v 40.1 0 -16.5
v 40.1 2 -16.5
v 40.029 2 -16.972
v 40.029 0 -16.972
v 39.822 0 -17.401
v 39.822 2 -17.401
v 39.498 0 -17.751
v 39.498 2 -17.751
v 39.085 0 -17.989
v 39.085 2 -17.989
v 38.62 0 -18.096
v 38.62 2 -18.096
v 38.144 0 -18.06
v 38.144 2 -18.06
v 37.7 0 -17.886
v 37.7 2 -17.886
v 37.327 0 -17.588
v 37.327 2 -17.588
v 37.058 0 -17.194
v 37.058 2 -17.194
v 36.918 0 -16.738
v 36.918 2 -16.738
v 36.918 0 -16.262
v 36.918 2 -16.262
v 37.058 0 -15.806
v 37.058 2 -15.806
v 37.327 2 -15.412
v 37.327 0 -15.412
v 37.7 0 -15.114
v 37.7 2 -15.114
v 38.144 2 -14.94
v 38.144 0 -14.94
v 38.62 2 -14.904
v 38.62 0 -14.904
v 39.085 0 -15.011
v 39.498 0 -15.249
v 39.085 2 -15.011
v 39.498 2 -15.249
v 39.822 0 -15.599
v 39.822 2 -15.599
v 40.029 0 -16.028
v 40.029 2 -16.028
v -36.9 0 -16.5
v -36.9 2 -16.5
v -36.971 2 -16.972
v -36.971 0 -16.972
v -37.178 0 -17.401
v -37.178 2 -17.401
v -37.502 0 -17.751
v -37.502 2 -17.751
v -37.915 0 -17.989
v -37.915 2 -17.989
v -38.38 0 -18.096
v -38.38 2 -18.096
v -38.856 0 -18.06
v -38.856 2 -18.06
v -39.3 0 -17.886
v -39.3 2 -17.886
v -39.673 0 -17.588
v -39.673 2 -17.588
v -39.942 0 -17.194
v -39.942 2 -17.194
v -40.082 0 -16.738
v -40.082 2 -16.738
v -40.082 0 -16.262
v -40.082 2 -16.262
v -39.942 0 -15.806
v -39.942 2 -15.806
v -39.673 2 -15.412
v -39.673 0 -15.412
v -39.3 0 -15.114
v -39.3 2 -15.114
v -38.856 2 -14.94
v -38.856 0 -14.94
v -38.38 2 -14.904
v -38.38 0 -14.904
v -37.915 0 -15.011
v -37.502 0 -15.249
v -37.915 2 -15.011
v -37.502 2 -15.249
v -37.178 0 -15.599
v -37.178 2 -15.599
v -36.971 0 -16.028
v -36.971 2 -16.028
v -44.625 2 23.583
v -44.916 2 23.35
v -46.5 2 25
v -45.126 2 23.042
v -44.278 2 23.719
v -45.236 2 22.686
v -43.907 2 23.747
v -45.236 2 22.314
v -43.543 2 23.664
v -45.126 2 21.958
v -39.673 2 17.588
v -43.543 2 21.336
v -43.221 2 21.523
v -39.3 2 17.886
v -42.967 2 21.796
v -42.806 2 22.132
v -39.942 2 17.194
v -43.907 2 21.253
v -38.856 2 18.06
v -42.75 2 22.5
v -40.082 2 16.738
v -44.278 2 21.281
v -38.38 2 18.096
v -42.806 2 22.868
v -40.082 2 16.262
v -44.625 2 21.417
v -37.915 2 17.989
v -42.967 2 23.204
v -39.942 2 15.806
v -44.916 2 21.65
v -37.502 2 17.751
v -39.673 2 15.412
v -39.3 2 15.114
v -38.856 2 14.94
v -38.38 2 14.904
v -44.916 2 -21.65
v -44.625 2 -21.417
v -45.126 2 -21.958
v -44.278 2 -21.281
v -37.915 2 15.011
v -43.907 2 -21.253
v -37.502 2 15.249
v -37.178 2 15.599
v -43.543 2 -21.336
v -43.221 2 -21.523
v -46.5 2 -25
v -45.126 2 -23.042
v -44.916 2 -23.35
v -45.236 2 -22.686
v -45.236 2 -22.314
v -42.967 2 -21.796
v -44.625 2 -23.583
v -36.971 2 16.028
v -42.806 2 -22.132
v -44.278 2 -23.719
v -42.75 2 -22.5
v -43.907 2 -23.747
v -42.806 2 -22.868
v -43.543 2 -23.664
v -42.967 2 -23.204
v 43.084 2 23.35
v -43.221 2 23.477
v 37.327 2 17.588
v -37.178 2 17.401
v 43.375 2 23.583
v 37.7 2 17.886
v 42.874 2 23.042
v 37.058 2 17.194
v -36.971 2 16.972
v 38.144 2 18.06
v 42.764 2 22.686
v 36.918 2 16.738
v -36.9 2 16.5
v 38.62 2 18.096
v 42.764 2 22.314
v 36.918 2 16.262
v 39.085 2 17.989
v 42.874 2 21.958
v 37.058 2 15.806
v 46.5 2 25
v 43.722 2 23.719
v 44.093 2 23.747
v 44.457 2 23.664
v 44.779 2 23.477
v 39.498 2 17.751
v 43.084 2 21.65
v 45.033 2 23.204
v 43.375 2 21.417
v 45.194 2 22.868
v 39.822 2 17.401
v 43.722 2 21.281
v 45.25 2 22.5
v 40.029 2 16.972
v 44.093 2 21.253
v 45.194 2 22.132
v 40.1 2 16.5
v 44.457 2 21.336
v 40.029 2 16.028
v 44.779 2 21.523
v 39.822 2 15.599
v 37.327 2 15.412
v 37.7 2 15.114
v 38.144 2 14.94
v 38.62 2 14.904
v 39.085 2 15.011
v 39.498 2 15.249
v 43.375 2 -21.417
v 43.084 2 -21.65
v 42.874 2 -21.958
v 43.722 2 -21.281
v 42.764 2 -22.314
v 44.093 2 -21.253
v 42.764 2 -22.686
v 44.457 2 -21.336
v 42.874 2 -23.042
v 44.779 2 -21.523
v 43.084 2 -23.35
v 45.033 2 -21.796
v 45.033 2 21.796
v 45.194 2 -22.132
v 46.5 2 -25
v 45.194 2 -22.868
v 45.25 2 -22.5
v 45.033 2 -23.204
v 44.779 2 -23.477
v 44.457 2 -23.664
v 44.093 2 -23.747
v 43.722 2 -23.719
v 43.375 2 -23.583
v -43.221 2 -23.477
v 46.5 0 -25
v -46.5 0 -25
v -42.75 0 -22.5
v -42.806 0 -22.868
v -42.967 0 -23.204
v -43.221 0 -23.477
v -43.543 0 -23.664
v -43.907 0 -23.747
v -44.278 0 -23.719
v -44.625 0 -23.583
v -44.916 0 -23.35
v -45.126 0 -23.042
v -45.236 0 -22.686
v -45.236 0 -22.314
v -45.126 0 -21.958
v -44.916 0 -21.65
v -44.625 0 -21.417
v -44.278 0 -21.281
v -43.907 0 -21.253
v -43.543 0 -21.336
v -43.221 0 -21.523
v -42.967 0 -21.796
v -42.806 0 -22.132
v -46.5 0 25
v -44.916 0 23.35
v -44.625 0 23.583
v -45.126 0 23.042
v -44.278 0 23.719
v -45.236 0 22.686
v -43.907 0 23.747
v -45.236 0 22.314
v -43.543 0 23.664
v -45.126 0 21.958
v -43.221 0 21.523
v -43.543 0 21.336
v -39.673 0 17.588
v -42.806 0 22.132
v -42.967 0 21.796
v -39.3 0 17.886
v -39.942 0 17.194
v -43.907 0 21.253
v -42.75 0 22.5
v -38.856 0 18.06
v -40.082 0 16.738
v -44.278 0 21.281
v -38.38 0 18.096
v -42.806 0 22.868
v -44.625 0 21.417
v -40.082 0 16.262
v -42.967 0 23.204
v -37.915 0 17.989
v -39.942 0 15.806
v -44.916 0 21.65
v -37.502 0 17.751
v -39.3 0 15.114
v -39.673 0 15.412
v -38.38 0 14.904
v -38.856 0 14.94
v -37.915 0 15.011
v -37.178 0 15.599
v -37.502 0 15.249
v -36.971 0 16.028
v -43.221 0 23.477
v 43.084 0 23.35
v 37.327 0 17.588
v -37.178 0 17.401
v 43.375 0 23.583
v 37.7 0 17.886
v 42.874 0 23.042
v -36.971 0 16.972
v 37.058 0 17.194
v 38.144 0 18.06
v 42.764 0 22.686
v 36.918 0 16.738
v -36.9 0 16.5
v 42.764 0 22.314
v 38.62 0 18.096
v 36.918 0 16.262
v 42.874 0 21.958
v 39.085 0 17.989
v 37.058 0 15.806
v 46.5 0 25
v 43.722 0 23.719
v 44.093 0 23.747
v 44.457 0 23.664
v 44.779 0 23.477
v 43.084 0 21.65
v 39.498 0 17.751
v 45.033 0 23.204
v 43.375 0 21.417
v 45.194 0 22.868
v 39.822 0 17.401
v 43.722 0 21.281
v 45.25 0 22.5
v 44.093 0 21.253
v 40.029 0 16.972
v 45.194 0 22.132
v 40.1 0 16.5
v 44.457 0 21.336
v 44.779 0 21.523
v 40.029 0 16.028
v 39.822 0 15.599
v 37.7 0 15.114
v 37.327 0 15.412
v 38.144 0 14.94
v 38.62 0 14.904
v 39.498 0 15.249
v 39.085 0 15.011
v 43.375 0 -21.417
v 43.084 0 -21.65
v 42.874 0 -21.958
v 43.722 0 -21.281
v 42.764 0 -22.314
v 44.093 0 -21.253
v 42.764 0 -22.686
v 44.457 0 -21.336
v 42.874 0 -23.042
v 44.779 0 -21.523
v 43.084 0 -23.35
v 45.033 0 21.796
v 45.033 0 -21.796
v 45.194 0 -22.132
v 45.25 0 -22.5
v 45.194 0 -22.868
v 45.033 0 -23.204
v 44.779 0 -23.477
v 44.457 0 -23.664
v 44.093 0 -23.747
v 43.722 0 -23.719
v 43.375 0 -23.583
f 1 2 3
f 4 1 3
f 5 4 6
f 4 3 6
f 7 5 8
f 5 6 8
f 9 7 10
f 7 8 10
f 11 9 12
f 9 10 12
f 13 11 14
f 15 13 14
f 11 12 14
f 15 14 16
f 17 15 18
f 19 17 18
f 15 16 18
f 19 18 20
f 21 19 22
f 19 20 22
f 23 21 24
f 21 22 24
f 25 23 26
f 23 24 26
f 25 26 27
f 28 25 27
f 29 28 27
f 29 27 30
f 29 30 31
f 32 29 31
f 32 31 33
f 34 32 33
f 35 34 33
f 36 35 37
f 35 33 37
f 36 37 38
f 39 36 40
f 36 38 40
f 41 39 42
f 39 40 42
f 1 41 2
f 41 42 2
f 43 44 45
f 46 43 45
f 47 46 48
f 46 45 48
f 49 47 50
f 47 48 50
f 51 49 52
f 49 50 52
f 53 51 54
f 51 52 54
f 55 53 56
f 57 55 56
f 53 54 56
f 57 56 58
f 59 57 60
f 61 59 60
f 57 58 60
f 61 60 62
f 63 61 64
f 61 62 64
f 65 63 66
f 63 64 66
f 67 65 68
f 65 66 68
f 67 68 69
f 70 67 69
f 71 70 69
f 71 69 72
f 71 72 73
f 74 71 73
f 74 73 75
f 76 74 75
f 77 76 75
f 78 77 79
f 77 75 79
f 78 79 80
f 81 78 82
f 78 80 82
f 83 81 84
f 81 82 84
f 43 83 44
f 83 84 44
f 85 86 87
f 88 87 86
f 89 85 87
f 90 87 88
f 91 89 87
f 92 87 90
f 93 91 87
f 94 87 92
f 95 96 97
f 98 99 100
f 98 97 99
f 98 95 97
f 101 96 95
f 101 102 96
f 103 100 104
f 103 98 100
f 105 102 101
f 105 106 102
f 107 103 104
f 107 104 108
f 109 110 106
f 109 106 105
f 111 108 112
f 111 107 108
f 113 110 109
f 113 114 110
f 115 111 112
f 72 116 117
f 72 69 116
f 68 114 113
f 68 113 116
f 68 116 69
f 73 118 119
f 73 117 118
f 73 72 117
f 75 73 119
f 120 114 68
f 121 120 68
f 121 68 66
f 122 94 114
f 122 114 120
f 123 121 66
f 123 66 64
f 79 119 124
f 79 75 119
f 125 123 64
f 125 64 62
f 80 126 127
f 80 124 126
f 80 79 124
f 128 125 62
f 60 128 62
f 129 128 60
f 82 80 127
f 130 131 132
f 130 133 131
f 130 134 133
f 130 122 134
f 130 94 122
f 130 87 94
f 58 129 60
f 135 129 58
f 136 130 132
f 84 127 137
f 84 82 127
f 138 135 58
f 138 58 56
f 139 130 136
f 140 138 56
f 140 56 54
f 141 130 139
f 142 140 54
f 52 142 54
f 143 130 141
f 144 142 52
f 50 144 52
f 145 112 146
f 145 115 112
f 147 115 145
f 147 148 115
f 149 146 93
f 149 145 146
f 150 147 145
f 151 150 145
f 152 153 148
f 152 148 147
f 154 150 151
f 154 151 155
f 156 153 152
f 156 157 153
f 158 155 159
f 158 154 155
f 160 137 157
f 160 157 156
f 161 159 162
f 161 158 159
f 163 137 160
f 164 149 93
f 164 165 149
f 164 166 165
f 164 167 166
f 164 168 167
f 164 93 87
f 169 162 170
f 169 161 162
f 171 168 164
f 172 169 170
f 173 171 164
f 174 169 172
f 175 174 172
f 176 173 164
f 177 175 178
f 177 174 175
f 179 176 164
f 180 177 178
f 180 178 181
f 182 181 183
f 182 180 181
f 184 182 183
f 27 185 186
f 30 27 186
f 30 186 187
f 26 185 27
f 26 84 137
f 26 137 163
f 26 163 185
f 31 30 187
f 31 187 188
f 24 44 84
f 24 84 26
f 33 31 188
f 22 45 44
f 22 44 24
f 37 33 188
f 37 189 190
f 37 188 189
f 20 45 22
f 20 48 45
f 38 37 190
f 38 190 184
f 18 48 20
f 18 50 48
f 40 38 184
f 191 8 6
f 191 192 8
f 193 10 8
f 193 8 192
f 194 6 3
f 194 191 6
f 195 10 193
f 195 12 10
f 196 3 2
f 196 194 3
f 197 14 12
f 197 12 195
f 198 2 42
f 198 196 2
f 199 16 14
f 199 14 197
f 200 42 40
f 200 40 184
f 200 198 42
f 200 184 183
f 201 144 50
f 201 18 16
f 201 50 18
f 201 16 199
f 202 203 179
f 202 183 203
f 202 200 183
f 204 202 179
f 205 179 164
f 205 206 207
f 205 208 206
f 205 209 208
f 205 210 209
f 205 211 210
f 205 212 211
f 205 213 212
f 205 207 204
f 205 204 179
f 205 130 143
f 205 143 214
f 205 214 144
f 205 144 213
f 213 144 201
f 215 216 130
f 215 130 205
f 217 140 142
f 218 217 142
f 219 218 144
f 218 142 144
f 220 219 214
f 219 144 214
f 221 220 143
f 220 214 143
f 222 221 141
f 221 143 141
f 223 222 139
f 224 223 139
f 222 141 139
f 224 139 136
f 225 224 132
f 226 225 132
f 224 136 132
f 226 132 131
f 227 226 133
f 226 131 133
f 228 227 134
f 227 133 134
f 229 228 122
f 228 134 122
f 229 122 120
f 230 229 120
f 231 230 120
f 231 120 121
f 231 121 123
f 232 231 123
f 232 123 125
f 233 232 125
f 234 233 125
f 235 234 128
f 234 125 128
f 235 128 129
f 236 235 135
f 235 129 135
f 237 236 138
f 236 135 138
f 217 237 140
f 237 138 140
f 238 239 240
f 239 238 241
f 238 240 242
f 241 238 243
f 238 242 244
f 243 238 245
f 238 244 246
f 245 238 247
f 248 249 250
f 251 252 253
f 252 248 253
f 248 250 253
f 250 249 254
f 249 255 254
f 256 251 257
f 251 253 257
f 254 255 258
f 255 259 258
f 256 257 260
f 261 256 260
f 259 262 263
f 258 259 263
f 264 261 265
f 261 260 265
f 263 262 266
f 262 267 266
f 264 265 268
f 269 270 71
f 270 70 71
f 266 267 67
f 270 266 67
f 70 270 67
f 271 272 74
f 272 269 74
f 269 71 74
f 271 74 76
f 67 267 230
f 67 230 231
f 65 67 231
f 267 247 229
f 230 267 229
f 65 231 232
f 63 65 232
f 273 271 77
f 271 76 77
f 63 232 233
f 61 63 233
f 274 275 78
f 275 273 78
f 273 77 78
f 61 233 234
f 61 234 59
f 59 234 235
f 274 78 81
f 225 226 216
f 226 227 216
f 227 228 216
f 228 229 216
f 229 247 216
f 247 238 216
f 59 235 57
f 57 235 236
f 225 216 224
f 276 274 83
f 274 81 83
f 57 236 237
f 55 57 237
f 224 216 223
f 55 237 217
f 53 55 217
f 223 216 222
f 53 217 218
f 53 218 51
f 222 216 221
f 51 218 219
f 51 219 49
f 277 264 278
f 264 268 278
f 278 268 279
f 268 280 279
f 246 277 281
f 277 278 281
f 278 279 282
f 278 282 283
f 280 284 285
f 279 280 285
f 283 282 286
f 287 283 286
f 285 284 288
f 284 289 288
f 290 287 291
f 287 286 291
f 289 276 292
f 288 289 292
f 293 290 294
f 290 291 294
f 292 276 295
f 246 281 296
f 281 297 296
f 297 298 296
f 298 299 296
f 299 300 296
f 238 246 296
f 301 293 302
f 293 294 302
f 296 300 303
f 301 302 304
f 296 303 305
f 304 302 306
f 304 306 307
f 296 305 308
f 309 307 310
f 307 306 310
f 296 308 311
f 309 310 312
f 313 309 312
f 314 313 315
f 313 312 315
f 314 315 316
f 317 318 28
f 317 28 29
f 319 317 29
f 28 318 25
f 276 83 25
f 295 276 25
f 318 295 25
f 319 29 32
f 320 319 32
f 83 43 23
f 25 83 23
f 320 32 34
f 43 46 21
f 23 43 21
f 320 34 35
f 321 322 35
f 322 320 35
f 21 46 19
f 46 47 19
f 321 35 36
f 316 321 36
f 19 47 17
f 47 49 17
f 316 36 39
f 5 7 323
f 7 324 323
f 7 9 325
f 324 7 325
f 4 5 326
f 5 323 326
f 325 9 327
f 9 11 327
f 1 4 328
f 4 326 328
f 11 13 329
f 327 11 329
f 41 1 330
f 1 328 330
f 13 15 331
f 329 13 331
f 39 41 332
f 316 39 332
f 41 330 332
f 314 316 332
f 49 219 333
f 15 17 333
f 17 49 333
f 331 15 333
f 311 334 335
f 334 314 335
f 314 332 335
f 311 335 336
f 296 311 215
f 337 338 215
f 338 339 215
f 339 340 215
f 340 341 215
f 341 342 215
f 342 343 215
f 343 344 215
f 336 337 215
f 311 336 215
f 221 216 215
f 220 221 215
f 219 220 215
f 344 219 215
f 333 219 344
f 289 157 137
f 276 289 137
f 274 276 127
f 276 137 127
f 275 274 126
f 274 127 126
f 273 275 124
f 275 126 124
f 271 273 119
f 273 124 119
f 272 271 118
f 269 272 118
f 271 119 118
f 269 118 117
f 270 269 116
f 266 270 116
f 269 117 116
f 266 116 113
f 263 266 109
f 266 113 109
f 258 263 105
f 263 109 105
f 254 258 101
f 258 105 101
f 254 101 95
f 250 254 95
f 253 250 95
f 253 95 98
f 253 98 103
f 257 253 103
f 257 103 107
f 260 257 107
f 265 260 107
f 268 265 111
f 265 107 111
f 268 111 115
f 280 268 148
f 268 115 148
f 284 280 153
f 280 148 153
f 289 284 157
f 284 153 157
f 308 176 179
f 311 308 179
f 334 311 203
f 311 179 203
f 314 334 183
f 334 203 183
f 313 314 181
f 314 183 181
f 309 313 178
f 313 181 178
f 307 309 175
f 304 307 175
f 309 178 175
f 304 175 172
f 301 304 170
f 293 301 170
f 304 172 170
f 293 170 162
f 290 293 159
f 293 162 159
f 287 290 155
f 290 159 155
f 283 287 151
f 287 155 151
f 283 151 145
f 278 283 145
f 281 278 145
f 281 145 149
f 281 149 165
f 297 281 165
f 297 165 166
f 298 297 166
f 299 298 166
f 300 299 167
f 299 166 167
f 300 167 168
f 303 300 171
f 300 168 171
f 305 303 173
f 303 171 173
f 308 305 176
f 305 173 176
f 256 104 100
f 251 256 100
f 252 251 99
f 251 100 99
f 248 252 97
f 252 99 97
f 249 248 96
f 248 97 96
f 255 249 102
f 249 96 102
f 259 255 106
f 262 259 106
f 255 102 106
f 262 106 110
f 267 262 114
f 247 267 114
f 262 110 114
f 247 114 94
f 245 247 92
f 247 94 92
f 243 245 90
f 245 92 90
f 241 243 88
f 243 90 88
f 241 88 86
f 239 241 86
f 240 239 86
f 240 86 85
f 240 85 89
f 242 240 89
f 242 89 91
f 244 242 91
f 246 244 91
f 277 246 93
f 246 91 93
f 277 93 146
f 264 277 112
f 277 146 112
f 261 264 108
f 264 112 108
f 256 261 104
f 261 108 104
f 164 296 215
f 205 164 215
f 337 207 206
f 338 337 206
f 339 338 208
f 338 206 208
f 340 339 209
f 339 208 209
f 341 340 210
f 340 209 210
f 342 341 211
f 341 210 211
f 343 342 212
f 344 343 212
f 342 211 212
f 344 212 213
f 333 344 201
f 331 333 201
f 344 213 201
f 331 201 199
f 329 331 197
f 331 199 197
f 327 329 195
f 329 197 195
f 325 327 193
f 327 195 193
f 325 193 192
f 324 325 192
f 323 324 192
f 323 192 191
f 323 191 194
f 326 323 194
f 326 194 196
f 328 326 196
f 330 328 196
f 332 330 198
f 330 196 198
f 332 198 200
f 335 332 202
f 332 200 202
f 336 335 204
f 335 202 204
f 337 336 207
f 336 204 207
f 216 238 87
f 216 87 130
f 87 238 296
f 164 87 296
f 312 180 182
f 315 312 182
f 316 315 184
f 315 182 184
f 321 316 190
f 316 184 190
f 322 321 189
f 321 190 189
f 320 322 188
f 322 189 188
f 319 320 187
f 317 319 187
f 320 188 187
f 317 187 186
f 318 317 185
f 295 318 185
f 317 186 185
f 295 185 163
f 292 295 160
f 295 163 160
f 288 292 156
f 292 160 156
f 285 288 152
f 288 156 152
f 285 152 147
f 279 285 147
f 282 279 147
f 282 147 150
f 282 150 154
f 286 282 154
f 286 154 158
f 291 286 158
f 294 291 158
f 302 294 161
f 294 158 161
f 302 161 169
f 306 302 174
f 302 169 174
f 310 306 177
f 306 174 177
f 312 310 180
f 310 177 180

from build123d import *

# Parameters (mm, degrees)
SKETCH1_W           = 93
SKETCH1_H           = 50
BOSS_EXTRUDE1_DEPTH = 2
SKETCH2_R           = 1.25
CUT_EXTRUDE1_DEPTH  = 2
SKETCH3_R           = 1.6
CUT_EXTRUDE2_DEPTH  = 2


with BuildPart() as part:
    # Sketch1 → Boss-Extrude1 (new body)
    with BuildSketch(Plane(origin=(0, 0, 0), x_dir=(1, 0, 0), z_dir=(0, 1, 0))):
        Rectangle(SKETCH1_W, SKETCH1_H)
    extrude(amount=BOSS_EXTRUDE1_DEPTH)

    # Sketch2 → Cut-Extrude1 (cut)
    with BuildSketch(Plane(origin=(0, 2, 0), x_dir=(1, 0, 0), z_dir=(0, 1, 0))):
        with Locations((-44, 22.5)):
            Circle(SKETCH2_R)
        with Locations((44, 22.5)):
            Circle(SKETCH2_R)
        with Locations((44, -22.5)):
            Circle(SKETCH2_R)
        with Locations((-44, -22.5)):
            Circle(SKETCH2_R)
    extrude(amount=-CUT_EXTRUDE1_DEPTH, mode=Mode.SUBTRACT)

    # Sketch3 → Cut-Extrude2 (cut)
    with BuildSketch(Plane(origin=(0, 2, 0), x_dir=(1, 0, 0), z_dir=(0, 1, 0))):
        with Locations((-38.5, 16.5)):
            Circle(SKETCH3_R)
        with Locations((-38.5, -16.5)):
            Circle(SKETCH3_R)
        with Locations((38.5, 16.5)):
            Circle(SKETCH3_R)
        with Locations((38.5, -16.5)):
            Circle(SKETCH3_R)
    extrude(amount=-CUT_EXTRUDE2_DEPTH, mode=Mode.SUBTRACT)


solid = part.part
